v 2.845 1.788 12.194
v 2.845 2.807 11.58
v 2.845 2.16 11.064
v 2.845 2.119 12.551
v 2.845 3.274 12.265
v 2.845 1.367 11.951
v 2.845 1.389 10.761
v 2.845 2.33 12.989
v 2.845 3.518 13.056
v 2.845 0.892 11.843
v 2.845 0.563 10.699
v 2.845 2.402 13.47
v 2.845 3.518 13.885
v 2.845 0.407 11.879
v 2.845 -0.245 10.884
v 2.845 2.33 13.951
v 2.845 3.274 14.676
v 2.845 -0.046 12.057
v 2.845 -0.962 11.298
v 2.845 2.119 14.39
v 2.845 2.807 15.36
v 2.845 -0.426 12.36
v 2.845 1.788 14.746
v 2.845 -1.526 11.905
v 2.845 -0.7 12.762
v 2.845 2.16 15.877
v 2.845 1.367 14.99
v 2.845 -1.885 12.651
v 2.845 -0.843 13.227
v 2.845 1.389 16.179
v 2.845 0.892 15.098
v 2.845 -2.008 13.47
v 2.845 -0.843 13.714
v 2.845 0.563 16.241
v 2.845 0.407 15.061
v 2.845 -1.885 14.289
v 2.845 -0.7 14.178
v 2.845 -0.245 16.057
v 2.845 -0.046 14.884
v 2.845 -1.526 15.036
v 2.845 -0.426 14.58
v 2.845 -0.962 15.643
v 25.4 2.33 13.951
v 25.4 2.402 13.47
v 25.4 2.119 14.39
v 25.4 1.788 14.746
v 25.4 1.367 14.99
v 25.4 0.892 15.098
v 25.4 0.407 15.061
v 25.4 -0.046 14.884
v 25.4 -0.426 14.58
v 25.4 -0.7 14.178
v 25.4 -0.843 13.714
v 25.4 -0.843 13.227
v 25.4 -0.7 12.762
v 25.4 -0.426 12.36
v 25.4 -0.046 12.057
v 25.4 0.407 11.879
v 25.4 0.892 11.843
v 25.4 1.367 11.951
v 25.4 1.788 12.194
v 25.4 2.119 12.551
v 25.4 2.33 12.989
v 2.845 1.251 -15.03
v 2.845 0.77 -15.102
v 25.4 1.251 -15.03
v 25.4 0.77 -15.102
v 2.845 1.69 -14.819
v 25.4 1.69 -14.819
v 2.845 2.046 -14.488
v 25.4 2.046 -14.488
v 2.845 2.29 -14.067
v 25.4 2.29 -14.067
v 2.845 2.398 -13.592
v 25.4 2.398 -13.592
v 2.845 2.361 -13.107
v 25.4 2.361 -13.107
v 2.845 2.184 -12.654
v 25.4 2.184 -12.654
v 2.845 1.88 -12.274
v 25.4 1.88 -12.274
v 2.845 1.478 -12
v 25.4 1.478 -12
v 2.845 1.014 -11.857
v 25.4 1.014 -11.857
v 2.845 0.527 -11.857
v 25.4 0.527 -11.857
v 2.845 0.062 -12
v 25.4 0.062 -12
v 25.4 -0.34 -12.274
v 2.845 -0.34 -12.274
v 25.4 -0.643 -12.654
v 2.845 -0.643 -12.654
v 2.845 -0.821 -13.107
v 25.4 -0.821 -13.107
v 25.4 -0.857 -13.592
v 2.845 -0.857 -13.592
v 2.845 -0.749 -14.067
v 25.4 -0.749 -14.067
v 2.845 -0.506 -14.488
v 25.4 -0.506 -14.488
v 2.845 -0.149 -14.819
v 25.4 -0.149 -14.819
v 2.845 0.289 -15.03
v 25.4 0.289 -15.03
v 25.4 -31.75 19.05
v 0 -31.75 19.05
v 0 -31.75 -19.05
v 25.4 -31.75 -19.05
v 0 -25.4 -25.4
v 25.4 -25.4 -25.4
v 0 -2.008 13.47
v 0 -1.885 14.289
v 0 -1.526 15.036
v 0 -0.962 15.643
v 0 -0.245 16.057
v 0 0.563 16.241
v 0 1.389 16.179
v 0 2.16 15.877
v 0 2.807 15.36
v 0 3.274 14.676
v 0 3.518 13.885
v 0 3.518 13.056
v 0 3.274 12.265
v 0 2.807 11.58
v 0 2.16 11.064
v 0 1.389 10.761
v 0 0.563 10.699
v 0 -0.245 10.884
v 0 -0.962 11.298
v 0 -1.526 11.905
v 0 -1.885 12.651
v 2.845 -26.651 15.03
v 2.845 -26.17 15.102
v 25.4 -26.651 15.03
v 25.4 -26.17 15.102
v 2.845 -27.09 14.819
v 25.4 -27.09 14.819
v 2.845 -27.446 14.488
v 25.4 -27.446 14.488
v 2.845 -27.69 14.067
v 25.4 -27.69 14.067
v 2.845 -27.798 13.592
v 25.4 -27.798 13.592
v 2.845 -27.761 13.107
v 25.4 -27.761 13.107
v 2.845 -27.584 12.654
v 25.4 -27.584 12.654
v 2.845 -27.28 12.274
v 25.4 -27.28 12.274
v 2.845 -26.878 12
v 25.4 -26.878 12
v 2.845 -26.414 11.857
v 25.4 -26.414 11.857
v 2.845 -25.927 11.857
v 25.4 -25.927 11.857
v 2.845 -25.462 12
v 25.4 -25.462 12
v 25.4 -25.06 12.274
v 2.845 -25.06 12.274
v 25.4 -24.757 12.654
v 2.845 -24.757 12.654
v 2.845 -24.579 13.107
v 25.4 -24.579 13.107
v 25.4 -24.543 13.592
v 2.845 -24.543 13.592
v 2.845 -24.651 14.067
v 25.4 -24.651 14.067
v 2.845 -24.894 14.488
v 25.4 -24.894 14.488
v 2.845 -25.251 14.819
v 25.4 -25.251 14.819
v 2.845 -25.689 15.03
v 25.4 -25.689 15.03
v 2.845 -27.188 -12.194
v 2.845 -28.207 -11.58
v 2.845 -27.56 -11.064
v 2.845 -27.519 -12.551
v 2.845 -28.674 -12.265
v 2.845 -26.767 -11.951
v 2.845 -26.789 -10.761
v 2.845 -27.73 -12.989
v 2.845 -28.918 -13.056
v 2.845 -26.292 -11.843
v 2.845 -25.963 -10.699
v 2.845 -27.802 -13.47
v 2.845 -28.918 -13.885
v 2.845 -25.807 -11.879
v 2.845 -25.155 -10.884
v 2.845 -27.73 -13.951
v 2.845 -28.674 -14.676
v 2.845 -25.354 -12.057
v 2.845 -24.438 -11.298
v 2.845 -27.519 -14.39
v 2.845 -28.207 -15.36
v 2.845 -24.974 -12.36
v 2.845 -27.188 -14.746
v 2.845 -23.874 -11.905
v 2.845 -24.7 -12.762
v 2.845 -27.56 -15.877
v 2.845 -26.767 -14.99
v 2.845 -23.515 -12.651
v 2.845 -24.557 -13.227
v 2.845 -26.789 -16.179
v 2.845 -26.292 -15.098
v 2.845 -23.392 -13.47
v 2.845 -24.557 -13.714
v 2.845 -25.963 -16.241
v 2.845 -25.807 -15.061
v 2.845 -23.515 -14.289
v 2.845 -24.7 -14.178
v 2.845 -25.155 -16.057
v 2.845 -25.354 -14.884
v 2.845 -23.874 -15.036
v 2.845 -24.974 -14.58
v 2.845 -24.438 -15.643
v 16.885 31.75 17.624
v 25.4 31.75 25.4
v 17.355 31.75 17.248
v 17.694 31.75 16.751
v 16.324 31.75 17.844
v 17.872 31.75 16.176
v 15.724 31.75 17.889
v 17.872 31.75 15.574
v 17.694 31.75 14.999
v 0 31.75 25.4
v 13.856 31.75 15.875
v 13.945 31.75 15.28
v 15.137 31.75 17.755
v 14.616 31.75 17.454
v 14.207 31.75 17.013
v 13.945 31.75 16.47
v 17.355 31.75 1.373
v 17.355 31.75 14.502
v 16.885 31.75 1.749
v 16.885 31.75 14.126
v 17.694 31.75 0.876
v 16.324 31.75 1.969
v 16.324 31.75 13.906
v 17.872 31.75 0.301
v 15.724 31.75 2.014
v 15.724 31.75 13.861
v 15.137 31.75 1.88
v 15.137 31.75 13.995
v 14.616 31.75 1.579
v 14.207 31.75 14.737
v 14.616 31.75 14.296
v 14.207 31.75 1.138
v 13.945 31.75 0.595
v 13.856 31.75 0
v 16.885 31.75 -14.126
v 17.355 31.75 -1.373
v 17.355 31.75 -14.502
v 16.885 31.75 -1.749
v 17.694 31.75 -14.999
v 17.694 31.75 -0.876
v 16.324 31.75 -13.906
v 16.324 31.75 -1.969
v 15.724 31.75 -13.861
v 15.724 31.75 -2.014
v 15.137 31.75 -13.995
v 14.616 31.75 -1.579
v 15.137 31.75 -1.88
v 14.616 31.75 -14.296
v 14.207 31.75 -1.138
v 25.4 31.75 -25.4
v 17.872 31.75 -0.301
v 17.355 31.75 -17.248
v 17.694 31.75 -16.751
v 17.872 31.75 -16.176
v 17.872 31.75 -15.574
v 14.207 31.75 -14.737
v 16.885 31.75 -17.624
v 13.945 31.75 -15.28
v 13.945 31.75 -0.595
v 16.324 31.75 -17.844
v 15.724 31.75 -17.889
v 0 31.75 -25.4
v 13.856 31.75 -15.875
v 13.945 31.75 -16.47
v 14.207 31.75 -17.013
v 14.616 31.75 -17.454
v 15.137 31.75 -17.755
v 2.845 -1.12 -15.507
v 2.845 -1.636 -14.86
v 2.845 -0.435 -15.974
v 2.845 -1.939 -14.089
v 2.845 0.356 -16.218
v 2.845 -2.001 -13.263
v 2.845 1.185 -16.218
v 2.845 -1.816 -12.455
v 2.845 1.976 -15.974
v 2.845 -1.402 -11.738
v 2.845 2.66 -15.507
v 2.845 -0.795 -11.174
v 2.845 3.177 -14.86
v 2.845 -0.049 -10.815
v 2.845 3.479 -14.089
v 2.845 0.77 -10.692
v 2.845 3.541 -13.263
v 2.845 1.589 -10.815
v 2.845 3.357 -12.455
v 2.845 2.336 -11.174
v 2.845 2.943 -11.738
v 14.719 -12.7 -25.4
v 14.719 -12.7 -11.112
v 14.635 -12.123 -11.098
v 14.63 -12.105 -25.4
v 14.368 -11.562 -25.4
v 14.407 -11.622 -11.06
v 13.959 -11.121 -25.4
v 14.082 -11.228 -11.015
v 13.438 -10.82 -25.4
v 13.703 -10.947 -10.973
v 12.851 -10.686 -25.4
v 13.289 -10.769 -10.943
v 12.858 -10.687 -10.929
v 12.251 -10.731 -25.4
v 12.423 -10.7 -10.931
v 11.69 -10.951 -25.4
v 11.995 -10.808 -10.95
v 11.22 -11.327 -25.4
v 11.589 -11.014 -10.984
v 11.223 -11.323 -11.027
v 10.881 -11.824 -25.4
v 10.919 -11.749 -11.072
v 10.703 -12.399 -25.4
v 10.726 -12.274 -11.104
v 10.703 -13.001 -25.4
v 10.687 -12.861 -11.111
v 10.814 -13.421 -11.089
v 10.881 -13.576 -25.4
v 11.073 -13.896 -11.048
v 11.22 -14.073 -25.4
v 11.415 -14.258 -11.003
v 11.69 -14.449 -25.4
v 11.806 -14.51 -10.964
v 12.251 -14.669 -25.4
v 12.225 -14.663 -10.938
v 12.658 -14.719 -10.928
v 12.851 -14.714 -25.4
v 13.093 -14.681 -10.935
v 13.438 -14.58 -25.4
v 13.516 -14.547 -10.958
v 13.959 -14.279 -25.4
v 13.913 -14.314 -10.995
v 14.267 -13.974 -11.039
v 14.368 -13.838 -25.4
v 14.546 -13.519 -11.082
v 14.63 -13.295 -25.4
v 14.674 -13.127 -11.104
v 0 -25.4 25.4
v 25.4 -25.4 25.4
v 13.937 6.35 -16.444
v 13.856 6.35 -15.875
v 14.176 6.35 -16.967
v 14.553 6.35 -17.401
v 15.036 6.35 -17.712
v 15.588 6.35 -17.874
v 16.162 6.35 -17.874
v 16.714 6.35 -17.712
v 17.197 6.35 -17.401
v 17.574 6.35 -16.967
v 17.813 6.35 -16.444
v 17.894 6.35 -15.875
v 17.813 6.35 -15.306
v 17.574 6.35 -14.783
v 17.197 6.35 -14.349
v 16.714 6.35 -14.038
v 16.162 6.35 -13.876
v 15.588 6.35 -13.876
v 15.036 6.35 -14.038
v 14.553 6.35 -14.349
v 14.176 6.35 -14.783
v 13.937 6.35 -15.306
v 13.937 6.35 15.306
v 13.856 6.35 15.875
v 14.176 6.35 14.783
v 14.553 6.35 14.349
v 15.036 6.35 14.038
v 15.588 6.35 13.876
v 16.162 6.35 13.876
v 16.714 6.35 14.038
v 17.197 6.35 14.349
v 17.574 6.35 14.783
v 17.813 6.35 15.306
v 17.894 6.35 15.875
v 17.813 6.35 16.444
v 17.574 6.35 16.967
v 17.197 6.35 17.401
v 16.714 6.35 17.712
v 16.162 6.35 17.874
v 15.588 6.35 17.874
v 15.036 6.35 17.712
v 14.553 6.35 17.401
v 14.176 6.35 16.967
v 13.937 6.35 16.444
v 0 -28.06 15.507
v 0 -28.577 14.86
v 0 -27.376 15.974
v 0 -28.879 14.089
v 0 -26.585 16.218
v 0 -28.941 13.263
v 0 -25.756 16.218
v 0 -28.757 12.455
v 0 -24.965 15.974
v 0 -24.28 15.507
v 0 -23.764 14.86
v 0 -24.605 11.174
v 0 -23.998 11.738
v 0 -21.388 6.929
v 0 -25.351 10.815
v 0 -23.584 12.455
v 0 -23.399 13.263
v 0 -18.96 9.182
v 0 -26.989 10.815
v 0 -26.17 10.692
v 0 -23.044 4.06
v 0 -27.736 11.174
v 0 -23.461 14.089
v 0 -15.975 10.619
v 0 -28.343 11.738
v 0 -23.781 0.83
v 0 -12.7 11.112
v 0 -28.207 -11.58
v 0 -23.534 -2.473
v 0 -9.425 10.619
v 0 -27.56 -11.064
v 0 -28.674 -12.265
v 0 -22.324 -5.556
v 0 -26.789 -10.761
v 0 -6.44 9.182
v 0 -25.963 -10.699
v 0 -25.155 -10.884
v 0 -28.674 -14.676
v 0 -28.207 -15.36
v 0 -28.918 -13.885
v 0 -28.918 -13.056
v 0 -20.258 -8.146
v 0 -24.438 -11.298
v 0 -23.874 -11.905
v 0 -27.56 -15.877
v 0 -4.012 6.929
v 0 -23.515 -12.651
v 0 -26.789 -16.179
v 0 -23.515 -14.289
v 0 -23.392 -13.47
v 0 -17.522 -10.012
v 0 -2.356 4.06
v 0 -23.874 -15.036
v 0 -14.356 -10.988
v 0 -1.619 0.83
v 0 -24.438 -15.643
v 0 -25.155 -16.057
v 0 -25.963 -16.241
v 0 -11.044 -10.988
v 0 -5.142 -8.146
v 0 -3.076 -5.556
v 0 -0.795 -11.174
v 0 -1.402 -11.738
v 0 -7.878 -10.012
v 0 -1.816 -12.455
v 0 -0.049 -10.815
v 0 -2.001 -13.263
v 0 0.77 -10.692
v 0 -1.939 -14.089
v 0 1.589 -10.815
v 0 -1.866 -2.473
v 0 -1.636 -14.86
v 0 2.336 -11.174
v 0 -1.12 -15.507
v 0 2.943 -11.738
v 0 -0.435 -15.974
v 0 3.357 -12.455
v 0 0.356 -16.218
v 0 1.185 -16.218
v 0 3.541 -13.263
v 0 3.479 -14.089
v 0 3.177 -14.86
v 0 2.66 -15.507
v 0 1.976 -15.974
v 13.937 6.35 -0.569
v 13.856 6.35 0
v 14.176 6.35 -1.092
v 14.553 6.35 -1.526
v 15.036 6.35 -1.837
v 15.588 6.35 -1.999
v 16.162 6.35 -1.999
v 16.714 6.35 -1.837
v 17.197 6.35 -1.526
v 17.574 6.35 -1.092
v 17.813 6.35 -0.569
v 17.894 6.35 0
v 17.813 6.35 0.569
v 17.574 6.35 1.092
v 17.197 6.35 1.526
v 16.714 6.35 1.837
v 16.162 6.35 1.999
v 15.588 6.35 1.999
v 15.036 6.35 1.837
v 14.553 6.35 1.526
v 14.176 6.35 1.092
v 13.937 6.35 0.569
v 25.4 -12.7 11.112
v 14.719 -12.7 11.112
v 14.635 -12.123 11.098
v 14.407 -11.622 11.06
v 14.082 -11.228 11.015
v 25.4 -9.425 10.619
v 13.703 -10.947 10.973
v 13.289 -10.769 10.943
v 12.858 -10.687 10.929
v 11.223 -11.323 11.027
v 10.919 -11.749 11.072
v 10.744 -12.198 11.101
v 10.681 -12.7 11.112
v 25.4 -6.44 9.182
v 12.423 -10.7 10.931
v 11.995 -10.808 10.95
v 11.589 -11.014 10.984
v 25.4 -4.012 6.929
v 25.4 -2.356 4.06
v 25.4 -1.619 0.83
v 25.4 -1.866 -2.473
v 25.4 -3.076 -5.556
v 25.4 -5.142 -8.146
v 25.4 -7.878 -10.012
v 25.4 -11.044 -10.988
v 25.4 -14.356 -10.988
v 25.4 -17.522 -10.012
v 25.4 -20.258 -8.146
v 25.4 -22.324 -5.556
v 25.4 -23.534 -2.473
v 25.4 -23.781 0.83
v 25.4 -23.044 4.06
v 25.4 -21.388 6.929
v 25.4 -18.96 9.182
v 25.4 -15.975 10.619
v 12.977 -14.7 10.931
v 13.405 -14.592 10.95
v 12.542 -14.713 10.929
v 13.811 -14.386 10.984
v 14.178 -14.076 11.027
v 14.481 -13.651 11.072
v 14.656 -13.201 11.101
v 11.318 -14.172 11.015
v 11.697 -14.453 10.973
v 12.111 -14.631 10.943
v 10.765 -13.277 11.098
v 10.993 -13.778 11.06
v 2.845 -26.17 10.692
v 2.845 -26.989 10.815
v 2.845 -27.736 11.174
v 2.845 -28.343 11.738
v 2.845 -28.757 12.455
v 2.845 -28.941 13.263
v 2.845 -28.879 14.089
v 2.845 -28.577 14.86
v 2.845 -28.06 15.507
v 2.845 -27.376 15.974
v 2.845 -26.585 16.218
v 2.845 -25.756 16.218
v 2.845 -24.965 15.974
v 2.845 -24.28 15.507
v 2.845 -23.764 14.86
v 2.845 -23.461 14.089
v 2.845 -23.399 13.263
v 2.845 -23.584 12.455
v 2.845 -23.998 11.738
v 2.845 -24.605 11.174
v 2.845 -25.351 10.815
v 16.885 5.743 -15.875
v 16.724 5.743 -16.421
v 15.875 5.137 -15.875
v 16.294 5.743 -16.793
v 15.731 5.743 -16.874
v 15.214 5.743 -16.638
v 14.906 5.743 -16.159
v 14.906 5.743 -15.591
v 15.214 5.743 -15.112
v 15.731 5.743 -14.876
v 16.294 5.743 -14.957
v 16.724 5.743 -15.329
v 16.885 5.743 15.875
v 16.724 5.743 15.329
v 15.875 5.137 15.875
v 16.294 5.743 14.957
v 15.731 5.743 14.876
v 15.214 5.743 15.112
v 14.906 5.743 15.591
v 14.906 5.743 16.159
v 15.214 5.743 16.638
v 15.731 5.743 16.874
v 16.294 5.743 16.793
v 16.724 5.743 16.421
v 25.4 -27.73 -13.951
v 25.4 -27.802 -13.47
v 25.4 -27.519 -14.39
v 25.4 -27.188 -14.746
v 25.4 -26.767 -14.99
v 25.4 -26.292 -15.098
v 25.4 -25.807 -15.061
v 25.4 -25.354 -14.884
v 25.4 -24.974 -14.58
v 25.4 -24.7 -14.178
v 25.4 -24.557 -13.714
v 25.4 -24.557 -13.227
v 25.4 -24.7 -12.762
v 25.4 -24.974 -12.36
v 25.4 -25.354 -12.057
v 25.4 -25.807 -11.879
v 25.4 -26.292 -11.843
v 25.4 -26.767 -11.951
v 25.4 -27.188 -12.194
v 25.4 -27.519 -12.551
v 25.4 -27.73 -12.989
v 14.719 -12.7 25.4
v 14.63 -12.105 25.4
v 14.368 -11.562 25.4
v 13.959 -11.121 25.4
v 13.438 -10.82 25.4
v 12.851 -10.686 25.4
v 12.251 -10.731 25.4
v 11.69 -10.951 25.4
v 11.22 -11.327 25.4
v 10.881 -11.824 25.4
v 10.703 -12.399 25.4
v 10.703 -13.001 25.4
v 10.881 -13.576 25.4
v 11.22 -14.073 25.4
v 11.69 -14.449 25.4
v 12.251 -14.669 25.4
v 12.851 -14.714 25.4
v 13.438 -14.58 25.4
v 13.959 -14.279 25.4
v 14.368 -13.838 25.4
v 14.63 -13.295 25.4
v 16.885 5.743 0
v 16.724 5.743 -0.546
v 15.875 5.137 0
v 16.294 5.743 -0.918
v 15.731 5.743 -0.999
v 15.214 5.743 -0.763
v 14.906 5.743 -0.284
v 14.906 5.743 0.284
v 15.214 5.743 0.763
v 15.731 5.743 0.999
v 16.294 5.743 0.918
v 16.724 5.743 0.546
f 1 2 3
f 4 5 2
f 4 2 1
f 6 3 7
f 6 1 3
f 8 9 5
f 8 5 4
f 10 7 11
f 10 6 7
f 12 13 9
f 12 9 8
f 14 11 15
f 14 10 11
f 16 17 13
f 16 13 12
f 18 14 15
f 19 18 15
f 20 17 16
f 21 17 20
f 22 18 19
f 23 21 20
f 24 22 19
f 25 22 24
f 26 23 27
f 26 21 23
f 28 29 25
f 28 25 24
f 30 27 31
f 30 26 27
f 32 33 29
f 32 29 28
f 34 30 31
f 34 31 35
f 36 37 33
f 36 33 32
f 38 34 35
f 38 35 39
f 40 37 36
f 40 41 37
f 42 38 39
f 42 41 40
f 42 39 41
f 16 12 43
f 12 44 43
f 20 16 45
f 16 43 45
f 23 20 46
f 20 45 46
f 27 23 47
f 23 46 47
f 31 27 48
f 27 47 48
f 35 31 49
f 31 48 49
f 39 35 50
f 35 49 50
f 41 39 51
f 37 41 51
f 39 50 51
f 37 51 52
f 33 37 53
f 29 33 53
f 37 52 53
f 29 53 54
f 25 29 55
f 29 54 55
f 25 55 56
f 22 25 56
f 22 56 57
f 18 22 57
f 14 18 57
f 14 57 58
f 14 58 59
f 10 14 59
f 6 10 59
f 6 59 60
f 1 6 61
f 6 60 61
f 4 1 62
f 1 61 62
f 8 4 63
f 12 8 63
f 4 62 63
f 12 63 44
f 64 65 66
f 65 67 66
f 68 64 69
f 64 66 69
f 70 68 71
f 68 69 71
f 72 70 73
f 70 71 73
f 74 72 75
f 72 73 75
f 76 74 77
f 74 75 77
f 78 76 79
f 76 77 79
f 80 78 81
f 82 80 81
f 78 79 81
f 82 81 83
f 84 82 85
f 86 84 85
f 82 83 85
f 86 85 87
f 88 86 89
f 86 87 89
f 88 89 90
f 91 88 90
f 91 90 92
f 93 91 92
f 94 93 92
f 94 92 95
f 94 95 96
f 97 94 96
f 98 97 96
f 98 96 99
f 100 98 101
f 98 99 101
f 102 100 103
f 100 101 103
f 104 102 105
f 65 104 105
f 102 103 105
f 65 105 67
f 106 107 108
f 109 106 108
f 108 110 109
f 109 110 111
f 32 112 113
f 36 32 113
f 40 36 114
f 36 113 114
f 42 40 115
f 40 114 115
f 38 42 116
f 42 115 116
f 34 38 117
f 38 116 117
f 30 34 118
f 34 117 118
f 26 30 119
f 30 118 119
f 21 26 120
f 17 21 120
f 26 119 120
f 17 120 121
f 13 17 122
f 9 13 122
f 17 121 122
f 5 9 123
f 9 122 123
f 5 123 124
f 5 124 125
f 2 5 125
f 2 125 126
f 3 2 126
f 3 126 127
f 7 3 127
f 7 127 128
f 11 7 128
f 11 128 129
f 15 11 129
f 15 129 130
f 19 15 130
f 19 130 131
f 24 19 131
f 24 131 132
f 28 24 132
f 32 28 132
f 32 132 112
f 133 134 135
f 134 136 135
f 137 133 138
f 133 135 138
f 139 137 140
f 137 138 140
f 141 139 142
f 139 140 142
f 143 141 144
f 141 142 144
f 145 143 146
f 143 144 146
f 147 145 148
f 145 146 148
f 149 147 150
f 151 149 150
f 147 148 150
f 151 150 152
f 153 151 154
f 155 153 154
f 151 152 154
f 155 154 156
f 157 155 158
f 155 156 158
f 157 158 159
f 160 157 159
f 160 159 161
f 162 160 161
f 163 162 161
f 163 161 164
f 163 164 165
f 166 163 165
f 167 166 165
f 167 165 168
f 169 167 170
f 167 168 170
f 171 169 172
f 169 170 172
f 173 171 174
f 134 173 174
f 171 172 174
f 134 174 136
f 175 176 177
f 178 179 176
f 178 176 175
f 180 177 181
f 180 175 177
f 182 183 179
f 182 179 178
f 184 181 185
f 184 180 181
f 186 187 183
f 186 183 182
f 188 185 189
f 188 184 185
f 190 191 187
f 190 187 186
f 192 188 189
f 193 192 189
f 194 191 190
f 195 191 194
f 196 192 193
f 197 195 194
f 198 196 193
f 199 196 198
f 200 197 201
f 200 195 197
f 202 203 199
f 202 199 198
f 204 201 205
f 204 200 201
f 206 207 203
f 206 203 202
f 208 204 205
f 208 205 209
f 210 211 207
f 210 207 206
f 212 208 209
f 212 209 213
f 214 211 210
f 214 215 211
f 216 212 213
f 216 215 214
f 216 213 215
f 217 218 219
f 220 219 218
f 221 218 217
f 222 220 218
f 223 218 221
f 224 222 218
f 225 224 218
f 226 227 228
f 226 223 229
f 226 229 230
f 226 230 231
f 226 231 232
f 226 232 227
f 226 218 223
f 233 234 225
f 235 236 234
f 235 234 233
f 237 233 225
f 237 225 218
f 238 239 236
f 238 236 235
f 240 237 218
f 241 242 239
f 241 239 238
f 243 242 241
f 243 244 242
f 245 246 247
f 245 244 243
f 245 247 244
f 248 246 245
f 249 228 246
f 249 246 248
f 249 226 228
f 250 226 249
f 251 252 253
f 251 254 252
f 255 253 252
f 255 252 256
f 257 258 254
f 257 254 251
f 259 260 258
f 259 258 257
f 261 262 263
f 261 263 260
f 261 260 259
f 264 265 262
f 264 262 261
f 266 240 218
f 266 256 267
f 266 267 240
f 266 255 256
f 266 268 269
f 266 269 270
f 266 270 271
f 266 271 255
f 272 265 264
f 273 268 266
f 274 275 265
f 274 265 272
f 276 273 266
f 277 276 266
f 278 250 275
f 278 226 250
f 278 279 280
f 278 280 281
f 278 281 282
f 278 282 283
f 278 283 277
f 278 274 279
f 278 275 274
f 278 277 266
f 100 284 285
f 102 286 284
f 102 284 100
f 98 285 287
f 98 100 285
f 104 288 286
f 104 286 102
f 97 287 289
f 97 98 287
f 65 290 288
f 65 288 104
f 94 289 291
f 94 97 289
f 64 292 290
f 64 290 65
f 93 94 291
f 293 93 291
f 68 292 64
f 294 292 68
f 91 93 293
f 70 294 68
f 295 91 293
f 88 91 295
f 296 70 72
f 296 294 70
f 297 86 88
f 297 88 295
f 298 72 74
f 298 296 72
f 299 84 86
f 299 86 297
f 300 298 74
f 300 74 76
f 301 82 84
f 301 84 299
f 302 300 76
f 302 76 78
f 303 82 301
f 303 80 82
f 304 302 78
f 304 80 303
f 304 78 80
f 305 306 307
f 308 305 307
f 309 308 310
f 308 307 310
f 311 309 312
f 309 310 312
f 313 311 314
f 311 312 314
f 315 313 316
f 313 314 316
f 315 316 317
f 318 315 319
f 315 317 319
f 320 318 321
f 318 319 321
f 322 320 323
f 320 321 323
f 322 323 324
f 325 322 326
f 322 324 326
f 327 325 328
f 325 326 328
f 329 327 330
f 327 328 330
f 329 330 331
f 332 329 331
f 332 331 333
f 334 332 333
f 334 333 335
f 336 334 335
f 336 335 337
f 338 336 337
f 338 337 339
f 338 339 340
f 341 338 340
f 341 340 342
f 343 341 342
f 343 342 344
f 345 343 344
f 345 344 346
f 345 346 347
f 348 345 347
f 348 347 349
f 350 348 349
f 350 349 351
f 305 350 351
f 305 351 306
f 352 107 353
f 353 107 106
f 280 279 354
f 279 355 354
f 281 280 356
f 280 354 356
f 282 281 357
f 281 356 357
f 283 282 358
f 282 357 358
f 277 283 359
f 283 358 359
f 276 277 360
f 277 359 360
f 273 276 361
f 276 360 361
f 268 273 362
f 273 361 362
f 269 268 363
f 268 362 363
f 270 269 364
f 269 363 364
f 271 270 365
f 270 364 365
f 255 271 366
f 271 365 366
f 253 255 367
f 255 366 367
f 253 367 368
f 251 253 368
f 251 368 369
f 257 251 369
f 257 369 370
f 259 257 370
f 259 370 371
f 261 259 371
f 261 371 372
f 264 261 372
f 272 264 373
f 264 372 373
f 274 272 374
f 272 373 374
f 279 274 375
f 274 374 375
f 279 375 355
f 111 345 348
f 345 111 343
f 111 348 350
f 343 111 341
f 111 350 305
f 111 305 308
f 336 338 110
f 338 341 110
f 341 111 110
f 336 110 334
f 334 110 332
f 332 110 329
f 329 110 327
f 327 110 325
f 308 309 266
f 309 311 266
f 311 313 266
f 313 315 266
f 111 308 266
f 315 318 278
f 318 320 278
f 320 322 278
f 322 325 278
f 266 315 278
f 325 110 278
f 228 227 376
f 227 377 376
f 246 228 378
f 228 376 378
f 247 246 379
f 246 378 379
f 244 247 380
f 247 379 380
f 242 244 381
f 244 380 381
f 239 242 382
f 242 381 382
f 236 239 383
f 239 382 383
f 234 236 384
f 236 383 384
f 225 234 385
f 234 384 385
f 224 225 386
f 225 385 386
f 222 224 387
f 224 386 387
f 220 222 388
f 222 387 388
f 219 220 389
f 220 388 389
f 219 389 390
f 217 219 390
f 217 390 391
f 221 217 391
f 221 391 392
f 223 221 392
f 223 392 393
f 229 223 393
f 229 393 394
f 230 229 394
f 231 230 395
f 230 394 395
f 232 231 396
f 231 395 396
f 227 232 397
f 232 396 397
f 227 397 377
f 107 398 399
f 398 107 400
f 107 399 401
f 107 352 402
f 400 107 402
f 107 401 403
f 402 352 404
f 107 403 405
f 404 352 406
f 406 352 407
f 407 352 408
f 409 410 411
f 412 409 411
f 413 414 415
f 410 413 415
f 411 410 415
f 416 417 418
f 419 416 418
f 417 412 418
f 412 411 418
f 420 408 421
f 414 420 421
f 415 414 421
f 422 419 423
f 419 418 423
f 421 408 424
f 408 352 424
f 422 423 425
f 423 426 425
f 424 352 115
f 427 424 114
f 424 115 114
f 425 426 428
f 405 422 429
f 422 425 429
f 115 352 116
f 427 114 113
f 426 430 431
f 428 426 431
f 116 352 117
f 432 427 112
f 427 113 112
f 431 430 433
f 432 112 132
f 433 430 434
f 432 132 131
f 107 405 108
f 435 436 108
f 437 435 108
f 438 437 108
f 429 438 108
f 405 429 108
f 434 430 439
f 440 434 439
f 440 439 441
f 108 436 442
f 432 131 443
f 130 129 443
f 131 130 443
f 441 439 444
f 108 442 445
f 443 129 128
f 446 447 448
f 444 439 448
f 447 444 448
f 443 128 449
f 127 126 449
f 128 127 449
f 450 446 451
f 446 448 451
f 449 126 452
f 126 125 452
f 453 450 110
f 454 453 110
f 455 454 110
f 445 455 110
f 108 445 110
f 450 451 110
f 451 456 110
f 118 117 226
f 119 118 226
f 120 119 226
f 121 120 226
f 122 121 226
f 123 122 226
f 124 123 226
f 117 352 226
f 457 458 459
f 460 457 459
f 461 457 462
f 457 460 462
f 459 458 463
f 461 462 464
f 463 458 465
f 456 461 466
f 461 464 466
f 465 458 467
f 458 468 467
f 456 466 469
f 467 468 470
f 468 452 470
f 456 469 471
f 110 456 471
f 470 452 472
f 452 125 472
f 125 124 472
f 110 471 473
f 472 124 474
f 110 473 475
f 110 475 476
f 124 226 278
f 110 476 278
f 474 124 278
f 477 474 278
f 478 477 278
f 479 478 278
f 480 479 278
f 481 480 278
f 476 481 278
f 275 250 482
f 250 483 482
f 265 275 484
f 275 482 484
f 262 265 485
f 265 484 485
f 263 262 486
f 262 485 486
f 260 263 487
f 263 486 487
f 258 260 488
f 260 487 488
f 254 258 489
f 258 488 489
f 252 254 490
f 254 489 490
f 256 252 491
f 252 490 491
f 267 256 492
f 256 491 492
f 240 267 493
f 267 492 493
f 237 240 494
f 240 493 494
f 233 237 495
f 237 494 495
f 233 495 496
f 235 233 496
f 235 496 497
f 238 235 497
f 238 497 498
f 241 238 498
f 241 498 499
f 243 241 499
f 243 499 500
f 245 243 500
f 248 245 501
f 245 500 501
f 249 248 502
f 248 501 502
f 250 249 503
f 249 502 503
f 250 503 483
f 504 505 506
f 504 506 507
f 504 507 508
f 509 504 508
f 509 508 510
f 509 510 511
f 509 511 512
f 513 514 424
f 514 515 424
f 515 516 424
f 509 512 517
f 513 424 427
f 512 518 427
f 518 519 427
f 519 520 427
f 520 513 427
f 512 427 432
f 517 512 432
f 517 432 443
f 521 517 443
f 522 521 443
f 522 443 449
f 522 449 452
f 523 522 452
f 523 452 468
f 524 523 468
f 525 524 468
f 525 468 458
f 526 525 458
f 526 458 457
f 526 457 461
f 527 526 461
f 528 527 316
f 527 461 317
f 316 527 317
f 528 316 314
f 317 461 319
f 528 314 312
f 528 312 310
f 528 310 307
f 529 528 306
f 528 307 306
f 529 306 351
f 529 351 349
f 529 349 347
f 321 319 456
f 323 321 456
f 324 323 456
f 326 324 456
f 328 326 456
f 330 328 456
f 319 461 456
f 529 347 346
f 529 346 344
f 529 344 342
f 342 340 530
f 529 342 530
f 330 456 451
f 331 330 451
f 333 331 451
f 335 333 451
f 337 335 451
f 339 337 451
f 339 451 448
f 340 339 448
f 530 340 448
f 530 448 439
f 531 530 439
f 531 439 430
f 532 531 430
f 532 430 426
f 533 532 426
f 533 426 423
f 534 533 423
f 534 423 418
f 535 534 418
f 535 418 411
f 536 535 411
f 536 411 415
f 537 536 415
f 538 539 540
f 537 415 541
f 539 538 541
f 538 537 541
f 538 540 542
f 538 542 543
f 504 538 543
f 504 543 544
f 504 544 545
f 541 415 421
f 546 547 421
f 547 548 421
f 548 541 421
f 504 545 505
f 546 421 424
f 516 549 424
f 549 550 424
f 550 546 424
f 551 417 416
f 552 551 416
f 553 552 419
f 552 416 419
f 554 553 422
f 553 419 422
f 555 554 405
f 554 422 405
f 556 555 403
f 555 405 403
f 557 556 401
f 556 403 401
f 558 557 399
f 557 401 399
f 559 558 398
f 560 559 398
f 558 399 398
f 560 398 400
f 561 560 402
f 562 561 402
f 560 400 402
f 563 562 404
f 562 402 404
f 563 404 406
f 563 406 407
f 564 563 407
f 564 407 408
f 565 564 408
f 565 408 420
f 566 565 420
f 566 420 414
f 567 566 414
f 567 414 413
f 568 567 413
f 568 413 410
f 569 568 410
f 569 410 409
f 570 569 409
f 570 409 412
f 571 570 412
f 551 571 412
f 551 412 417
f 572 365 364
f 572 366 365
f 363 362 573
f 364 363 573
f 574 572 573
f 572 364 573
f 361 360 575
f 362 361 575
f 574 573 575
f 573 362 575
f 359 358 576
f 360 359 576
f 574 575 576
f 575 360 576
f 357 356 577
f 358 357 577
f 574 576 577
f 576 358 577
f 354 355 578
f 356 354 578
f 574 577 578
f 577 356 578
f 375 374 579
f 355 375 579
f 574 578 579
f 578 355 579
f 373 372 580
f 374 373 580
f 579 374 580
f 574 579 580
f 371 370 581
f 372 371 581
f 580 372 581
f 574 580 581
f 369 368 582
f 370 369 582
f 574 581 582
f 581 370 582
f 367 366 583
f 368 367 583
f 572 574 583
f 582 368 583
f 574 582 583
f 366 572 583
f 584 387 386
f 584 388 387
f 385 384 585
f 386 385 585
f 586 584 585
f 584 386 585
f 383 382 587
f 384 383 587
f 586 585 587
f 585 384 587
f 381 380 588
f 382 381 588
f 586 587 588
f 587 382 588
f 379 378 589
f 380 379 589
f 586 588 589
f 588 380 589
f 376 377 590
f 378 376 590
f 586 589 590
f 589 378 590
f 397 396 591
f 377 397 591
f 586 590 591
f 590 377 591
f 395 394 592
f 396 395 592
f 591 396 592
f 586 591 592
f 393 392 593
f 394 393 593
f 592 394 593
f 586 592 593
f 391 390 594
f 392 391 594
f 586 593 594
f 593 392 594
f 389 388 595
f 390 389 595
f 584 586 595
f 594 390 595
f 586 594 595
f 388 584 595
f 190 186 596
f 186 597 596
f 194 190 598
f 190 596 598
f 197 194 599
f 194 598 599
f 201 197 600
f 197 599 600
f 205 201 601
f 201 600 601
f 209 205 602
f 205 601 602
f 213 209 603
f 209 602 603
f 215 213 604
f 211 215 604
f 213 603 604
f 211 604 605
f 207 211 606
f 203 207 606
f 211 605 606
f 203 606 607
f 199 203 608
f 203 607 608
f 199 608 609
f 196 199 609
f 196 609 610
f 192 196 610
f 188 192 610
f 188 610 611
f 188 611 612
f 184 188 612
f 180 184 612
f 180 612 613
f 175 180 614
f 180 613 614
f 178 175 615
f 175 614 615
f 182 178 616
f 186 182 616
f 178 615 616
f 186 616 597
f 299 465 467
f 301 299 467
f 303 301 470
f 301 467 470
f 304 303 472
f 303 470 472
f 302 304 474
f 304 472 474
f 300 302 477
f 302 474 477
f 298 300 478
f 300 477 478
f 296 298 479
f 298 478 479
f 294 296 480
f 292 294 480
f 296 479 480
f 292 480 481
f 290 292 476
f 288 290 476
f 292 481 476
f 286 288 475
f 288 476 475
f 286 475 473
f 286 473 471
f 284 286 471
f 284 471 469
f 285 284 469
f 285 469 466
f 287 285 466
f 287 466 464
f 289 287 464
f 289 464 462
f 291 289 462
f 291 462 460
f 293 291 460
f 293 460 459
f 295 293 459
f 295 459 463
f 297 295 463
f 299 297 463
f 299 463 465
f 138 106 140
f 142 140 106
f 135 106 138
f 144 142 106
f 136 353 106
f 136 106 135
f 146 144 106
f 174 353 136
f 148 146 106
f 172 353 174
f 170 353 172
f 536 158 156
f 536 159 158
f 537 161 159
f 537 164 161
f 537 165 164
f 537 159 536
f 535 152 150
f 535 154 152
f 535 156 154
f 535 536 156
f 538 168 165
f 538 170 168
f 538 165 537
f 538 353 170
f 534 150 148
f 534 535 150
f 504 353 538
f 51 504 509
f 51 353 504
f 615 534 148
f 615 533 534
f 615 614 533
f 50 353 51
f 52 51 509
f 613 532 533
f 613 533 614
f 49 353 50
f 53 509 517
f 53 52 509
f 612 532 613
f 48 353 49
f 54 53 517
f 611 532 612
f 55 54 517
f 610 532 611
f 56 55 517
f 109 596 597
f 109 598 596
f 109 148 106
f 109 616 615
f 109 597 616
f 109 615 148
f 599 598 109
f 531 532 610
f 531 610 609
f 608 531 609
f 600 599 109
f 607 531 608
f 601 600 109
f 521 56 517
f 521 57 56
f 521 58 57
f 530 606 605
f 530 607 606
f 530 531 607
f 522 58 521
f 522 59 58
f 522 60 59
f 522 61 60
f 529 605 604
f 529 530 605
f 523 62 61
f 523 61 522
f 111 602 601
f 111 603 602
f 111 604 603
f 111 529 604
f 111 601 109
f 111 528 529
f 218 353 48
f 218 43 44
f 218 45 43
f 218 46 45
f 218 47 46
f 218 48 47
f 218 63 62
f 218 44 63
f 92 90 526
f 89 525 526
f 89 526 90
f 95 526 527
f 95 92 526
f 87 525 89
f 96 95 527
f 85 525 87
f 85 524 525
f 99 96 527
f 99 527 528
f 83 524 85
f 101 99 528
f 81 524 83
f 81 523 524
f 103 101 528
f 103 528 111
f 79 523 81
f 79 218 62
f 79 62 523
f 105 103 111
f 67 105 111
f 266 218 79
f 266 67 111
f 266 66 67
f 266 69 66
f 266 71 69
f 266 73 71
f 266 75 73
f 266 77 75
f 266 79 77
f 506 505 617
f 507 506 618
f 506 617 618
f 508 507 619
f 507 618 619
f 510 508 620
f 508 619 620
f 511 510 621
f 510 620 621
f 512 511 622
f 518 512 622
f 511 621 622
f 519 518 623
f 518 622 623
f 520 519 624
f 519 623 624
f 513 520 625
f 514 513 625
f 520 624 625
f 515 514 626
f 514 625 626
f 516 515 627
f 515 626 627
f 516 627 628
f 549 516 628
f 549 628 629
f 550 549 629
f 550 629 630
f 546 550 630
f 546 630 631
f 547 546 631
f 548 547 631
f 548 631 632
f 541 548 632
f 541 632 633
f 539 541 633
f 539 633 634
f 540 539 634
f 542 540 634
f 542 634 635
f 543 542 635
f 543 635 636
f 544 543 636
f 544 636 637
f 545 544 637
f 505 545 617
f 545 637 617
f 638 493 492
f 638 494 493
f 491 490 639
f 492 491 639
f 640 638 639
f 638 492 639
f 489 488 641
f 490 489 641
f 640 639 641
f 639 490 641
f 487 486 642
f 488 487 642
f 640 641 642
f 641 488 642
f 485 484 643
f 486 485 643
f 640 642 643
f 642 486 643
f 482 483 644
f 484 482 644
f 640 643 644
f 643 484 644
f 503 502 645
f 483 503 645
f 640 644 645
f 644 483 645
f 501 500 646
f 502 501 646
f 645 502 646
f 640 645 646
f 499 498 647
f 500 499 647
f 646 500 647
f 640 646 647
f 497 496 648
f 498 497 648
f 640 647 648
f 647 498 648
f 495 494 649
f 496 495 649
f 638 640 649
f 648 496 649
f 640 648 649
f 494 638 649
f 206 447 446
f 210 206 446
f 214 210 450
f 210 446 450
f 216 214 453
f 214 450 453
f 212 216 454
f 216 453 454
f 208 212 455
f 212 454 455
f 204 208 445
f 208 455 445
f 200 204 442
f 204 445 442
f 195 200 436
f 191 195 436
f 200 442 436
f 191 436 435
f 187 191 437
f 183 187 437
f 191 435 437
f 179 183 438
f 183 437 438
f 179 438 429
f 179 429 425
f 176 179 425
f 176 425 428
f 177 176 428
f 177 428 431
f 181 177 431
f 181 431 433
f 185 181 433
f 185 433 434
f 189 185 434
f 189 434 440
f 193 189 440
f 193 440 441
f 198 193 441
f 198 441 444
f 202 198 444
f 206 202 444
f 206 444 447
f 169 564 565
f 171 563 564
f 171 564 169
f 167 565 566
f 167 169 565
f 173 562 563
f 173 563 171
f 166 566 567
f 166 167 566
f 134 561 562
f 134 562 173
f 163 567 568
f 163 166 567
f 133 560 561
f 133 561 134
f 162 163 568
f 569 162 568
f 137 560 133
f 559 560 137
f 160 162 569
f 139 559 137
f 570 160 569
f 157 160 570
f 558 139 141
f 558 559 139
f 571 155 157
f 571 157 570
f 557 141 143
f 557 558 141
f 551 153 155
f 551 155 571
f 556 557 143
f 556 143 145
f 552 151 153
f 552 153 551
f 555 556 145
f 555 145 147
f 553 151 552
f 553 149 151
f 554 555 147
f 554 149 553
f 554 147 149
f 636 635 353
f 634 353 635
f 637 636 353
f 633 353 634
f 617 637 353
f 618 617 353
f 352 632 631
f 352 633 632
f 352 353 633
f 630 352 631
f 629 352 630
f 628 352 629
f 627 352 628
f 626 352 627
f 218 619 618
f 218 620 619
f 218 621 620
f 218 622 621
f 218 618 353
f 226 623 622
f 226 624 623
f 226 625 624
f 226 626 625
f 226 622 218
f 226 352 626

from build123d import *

# Parameters (mm, degrees)
SKETCH1_W                                      = 50.8
SKETCH1_H                                      = 63.5
BASE_DEPTH                                     = 25.4
F_7_8_0_875_DIAMETER_HOLE1_D                   = 22.225
F_10_32_TAPPED_HOLE1_D                         = 4.0386
F_10_32_TAPPED_HOLE1_DEPTH                     = 25.4
F_10_32_TAPPED_HOLE1_TIP                       = 1.213317848
CBORE_FOR_4_SOCKET_HEAD_CAP_SCREW1_D           = 3.2639
CBORE_FOR_4_SOCKET_HEAD_CAP_SCREW1_CBORE_D     = 5.55752
CBORE_FOR_4_SOCKET_HEAD_CAP_SCREW1_CBORE_DEPTH = 2.8448
CIRPATTERN1_COUNT                              = 4
CHAMFER2_SIZE                                  = 6.35
F_10_32_TAPPED_HOLE2_D                         = 4.0386


with BuildPart() as part:
    # Sketch1 → Base (new body)
    with BuildSketch(Plane(origin=(0, 0, 0), x_dir=(0, 0, -1), z_dir=(1, 0, 0))):
        Rectangle(SKETCH1_W, SKETCH1_H)
    extrude(amount=BASE_DEPTH)

    # 7/8 (0.875) Diameter Hole1 (through all)
    with Locations(Plane(origin=(25.4, 0, 0), x_dir=(0, 0, -1), z_dir=(1, 0, 0))):
        with Locations((0, -12.7)):
            Hole(F_7_8_0_875_DIAMETER_HOLE1_D / 2)

    # #10-32 Tapped Hole1
    with Locations(Plane(origin=(0, 31.75, 0), x_dir=(1, 0, 0), z_dir=(0, 1, 0))):
        with Locations((15.875, 15.875), (15.875, -15.875), (15.875, 0)):
            Hole(F_10_32_TAPPED_HOLE1_D / 2, depth=F_10_32_TAPPED_HOLE1_DEPTH)
            with Locations((0, 0, -(F_10_32_TAPPED_HOLE1_DEPTH + F_10_32_TAPPED_HOLE1_TIP / 2))):  # 118° drill point
                Cone(0, F_10_32_TAPPED_HOLE1_D / 2, F_10_32_TAPPED_HOLE1_TIP, mode=Mode.SUBTRACT)

    # CBORE for #4 Socket Head Cap Screw1 (through all)
    with Locations(Plane.ZY):
        with Locations((-13.470384182, 0.770384182)):
            cbore_for_4_socket_head_cap_screw1 = CounterBoreHole(CBORE_FOR_4_SOCKET_HEAD_CAP_SCREW1_D / 2, CBORE_FOR_4_SOCKET_HEAD_CAP_SCREW1_CBORE_D / 2, CBORE_FOR_4_SOCKET_HEAD_CAP_SCREW1_CBORE_DEPTH)

    # CirPattern1: CBORE for #4 Socket Head Cap Screw1 ×4 about axis
    cirpattern1_axis = Axis((0, -12.7, 0), (1, 0, 0))
    for i in range(1, CIRPATTERN1_COUNT):
        add(cbore_for_4_socket_head_cap_screw1.rotate(cirpattern1_axis, i * 360 / CIRPATTERN1_COUNT), mode=Mode.SUBTRACT)

    # Chamfer2
    chamfer2_edges = [part.edges().sort_by_distance(p)[0] for p in [
        (12.7, -31.75, -25.4),
        (12.7, -31.75, 25.4),
    ]]
    chamfer(chamfer2_edges, length=CHAMFER2_SIZE)

    # #10-32 Tapped Hole2 (through all)
    with Locations(Plane(origin=(0, 0, -25.4), x_dir=(-1, 0, 0), z_dir=(0, 0, -1))):
        with Locations((-12.7, -12.7)):
            Hole(F_10_32_TAPPED_HOLE2_D / 2)


solid = part.part
